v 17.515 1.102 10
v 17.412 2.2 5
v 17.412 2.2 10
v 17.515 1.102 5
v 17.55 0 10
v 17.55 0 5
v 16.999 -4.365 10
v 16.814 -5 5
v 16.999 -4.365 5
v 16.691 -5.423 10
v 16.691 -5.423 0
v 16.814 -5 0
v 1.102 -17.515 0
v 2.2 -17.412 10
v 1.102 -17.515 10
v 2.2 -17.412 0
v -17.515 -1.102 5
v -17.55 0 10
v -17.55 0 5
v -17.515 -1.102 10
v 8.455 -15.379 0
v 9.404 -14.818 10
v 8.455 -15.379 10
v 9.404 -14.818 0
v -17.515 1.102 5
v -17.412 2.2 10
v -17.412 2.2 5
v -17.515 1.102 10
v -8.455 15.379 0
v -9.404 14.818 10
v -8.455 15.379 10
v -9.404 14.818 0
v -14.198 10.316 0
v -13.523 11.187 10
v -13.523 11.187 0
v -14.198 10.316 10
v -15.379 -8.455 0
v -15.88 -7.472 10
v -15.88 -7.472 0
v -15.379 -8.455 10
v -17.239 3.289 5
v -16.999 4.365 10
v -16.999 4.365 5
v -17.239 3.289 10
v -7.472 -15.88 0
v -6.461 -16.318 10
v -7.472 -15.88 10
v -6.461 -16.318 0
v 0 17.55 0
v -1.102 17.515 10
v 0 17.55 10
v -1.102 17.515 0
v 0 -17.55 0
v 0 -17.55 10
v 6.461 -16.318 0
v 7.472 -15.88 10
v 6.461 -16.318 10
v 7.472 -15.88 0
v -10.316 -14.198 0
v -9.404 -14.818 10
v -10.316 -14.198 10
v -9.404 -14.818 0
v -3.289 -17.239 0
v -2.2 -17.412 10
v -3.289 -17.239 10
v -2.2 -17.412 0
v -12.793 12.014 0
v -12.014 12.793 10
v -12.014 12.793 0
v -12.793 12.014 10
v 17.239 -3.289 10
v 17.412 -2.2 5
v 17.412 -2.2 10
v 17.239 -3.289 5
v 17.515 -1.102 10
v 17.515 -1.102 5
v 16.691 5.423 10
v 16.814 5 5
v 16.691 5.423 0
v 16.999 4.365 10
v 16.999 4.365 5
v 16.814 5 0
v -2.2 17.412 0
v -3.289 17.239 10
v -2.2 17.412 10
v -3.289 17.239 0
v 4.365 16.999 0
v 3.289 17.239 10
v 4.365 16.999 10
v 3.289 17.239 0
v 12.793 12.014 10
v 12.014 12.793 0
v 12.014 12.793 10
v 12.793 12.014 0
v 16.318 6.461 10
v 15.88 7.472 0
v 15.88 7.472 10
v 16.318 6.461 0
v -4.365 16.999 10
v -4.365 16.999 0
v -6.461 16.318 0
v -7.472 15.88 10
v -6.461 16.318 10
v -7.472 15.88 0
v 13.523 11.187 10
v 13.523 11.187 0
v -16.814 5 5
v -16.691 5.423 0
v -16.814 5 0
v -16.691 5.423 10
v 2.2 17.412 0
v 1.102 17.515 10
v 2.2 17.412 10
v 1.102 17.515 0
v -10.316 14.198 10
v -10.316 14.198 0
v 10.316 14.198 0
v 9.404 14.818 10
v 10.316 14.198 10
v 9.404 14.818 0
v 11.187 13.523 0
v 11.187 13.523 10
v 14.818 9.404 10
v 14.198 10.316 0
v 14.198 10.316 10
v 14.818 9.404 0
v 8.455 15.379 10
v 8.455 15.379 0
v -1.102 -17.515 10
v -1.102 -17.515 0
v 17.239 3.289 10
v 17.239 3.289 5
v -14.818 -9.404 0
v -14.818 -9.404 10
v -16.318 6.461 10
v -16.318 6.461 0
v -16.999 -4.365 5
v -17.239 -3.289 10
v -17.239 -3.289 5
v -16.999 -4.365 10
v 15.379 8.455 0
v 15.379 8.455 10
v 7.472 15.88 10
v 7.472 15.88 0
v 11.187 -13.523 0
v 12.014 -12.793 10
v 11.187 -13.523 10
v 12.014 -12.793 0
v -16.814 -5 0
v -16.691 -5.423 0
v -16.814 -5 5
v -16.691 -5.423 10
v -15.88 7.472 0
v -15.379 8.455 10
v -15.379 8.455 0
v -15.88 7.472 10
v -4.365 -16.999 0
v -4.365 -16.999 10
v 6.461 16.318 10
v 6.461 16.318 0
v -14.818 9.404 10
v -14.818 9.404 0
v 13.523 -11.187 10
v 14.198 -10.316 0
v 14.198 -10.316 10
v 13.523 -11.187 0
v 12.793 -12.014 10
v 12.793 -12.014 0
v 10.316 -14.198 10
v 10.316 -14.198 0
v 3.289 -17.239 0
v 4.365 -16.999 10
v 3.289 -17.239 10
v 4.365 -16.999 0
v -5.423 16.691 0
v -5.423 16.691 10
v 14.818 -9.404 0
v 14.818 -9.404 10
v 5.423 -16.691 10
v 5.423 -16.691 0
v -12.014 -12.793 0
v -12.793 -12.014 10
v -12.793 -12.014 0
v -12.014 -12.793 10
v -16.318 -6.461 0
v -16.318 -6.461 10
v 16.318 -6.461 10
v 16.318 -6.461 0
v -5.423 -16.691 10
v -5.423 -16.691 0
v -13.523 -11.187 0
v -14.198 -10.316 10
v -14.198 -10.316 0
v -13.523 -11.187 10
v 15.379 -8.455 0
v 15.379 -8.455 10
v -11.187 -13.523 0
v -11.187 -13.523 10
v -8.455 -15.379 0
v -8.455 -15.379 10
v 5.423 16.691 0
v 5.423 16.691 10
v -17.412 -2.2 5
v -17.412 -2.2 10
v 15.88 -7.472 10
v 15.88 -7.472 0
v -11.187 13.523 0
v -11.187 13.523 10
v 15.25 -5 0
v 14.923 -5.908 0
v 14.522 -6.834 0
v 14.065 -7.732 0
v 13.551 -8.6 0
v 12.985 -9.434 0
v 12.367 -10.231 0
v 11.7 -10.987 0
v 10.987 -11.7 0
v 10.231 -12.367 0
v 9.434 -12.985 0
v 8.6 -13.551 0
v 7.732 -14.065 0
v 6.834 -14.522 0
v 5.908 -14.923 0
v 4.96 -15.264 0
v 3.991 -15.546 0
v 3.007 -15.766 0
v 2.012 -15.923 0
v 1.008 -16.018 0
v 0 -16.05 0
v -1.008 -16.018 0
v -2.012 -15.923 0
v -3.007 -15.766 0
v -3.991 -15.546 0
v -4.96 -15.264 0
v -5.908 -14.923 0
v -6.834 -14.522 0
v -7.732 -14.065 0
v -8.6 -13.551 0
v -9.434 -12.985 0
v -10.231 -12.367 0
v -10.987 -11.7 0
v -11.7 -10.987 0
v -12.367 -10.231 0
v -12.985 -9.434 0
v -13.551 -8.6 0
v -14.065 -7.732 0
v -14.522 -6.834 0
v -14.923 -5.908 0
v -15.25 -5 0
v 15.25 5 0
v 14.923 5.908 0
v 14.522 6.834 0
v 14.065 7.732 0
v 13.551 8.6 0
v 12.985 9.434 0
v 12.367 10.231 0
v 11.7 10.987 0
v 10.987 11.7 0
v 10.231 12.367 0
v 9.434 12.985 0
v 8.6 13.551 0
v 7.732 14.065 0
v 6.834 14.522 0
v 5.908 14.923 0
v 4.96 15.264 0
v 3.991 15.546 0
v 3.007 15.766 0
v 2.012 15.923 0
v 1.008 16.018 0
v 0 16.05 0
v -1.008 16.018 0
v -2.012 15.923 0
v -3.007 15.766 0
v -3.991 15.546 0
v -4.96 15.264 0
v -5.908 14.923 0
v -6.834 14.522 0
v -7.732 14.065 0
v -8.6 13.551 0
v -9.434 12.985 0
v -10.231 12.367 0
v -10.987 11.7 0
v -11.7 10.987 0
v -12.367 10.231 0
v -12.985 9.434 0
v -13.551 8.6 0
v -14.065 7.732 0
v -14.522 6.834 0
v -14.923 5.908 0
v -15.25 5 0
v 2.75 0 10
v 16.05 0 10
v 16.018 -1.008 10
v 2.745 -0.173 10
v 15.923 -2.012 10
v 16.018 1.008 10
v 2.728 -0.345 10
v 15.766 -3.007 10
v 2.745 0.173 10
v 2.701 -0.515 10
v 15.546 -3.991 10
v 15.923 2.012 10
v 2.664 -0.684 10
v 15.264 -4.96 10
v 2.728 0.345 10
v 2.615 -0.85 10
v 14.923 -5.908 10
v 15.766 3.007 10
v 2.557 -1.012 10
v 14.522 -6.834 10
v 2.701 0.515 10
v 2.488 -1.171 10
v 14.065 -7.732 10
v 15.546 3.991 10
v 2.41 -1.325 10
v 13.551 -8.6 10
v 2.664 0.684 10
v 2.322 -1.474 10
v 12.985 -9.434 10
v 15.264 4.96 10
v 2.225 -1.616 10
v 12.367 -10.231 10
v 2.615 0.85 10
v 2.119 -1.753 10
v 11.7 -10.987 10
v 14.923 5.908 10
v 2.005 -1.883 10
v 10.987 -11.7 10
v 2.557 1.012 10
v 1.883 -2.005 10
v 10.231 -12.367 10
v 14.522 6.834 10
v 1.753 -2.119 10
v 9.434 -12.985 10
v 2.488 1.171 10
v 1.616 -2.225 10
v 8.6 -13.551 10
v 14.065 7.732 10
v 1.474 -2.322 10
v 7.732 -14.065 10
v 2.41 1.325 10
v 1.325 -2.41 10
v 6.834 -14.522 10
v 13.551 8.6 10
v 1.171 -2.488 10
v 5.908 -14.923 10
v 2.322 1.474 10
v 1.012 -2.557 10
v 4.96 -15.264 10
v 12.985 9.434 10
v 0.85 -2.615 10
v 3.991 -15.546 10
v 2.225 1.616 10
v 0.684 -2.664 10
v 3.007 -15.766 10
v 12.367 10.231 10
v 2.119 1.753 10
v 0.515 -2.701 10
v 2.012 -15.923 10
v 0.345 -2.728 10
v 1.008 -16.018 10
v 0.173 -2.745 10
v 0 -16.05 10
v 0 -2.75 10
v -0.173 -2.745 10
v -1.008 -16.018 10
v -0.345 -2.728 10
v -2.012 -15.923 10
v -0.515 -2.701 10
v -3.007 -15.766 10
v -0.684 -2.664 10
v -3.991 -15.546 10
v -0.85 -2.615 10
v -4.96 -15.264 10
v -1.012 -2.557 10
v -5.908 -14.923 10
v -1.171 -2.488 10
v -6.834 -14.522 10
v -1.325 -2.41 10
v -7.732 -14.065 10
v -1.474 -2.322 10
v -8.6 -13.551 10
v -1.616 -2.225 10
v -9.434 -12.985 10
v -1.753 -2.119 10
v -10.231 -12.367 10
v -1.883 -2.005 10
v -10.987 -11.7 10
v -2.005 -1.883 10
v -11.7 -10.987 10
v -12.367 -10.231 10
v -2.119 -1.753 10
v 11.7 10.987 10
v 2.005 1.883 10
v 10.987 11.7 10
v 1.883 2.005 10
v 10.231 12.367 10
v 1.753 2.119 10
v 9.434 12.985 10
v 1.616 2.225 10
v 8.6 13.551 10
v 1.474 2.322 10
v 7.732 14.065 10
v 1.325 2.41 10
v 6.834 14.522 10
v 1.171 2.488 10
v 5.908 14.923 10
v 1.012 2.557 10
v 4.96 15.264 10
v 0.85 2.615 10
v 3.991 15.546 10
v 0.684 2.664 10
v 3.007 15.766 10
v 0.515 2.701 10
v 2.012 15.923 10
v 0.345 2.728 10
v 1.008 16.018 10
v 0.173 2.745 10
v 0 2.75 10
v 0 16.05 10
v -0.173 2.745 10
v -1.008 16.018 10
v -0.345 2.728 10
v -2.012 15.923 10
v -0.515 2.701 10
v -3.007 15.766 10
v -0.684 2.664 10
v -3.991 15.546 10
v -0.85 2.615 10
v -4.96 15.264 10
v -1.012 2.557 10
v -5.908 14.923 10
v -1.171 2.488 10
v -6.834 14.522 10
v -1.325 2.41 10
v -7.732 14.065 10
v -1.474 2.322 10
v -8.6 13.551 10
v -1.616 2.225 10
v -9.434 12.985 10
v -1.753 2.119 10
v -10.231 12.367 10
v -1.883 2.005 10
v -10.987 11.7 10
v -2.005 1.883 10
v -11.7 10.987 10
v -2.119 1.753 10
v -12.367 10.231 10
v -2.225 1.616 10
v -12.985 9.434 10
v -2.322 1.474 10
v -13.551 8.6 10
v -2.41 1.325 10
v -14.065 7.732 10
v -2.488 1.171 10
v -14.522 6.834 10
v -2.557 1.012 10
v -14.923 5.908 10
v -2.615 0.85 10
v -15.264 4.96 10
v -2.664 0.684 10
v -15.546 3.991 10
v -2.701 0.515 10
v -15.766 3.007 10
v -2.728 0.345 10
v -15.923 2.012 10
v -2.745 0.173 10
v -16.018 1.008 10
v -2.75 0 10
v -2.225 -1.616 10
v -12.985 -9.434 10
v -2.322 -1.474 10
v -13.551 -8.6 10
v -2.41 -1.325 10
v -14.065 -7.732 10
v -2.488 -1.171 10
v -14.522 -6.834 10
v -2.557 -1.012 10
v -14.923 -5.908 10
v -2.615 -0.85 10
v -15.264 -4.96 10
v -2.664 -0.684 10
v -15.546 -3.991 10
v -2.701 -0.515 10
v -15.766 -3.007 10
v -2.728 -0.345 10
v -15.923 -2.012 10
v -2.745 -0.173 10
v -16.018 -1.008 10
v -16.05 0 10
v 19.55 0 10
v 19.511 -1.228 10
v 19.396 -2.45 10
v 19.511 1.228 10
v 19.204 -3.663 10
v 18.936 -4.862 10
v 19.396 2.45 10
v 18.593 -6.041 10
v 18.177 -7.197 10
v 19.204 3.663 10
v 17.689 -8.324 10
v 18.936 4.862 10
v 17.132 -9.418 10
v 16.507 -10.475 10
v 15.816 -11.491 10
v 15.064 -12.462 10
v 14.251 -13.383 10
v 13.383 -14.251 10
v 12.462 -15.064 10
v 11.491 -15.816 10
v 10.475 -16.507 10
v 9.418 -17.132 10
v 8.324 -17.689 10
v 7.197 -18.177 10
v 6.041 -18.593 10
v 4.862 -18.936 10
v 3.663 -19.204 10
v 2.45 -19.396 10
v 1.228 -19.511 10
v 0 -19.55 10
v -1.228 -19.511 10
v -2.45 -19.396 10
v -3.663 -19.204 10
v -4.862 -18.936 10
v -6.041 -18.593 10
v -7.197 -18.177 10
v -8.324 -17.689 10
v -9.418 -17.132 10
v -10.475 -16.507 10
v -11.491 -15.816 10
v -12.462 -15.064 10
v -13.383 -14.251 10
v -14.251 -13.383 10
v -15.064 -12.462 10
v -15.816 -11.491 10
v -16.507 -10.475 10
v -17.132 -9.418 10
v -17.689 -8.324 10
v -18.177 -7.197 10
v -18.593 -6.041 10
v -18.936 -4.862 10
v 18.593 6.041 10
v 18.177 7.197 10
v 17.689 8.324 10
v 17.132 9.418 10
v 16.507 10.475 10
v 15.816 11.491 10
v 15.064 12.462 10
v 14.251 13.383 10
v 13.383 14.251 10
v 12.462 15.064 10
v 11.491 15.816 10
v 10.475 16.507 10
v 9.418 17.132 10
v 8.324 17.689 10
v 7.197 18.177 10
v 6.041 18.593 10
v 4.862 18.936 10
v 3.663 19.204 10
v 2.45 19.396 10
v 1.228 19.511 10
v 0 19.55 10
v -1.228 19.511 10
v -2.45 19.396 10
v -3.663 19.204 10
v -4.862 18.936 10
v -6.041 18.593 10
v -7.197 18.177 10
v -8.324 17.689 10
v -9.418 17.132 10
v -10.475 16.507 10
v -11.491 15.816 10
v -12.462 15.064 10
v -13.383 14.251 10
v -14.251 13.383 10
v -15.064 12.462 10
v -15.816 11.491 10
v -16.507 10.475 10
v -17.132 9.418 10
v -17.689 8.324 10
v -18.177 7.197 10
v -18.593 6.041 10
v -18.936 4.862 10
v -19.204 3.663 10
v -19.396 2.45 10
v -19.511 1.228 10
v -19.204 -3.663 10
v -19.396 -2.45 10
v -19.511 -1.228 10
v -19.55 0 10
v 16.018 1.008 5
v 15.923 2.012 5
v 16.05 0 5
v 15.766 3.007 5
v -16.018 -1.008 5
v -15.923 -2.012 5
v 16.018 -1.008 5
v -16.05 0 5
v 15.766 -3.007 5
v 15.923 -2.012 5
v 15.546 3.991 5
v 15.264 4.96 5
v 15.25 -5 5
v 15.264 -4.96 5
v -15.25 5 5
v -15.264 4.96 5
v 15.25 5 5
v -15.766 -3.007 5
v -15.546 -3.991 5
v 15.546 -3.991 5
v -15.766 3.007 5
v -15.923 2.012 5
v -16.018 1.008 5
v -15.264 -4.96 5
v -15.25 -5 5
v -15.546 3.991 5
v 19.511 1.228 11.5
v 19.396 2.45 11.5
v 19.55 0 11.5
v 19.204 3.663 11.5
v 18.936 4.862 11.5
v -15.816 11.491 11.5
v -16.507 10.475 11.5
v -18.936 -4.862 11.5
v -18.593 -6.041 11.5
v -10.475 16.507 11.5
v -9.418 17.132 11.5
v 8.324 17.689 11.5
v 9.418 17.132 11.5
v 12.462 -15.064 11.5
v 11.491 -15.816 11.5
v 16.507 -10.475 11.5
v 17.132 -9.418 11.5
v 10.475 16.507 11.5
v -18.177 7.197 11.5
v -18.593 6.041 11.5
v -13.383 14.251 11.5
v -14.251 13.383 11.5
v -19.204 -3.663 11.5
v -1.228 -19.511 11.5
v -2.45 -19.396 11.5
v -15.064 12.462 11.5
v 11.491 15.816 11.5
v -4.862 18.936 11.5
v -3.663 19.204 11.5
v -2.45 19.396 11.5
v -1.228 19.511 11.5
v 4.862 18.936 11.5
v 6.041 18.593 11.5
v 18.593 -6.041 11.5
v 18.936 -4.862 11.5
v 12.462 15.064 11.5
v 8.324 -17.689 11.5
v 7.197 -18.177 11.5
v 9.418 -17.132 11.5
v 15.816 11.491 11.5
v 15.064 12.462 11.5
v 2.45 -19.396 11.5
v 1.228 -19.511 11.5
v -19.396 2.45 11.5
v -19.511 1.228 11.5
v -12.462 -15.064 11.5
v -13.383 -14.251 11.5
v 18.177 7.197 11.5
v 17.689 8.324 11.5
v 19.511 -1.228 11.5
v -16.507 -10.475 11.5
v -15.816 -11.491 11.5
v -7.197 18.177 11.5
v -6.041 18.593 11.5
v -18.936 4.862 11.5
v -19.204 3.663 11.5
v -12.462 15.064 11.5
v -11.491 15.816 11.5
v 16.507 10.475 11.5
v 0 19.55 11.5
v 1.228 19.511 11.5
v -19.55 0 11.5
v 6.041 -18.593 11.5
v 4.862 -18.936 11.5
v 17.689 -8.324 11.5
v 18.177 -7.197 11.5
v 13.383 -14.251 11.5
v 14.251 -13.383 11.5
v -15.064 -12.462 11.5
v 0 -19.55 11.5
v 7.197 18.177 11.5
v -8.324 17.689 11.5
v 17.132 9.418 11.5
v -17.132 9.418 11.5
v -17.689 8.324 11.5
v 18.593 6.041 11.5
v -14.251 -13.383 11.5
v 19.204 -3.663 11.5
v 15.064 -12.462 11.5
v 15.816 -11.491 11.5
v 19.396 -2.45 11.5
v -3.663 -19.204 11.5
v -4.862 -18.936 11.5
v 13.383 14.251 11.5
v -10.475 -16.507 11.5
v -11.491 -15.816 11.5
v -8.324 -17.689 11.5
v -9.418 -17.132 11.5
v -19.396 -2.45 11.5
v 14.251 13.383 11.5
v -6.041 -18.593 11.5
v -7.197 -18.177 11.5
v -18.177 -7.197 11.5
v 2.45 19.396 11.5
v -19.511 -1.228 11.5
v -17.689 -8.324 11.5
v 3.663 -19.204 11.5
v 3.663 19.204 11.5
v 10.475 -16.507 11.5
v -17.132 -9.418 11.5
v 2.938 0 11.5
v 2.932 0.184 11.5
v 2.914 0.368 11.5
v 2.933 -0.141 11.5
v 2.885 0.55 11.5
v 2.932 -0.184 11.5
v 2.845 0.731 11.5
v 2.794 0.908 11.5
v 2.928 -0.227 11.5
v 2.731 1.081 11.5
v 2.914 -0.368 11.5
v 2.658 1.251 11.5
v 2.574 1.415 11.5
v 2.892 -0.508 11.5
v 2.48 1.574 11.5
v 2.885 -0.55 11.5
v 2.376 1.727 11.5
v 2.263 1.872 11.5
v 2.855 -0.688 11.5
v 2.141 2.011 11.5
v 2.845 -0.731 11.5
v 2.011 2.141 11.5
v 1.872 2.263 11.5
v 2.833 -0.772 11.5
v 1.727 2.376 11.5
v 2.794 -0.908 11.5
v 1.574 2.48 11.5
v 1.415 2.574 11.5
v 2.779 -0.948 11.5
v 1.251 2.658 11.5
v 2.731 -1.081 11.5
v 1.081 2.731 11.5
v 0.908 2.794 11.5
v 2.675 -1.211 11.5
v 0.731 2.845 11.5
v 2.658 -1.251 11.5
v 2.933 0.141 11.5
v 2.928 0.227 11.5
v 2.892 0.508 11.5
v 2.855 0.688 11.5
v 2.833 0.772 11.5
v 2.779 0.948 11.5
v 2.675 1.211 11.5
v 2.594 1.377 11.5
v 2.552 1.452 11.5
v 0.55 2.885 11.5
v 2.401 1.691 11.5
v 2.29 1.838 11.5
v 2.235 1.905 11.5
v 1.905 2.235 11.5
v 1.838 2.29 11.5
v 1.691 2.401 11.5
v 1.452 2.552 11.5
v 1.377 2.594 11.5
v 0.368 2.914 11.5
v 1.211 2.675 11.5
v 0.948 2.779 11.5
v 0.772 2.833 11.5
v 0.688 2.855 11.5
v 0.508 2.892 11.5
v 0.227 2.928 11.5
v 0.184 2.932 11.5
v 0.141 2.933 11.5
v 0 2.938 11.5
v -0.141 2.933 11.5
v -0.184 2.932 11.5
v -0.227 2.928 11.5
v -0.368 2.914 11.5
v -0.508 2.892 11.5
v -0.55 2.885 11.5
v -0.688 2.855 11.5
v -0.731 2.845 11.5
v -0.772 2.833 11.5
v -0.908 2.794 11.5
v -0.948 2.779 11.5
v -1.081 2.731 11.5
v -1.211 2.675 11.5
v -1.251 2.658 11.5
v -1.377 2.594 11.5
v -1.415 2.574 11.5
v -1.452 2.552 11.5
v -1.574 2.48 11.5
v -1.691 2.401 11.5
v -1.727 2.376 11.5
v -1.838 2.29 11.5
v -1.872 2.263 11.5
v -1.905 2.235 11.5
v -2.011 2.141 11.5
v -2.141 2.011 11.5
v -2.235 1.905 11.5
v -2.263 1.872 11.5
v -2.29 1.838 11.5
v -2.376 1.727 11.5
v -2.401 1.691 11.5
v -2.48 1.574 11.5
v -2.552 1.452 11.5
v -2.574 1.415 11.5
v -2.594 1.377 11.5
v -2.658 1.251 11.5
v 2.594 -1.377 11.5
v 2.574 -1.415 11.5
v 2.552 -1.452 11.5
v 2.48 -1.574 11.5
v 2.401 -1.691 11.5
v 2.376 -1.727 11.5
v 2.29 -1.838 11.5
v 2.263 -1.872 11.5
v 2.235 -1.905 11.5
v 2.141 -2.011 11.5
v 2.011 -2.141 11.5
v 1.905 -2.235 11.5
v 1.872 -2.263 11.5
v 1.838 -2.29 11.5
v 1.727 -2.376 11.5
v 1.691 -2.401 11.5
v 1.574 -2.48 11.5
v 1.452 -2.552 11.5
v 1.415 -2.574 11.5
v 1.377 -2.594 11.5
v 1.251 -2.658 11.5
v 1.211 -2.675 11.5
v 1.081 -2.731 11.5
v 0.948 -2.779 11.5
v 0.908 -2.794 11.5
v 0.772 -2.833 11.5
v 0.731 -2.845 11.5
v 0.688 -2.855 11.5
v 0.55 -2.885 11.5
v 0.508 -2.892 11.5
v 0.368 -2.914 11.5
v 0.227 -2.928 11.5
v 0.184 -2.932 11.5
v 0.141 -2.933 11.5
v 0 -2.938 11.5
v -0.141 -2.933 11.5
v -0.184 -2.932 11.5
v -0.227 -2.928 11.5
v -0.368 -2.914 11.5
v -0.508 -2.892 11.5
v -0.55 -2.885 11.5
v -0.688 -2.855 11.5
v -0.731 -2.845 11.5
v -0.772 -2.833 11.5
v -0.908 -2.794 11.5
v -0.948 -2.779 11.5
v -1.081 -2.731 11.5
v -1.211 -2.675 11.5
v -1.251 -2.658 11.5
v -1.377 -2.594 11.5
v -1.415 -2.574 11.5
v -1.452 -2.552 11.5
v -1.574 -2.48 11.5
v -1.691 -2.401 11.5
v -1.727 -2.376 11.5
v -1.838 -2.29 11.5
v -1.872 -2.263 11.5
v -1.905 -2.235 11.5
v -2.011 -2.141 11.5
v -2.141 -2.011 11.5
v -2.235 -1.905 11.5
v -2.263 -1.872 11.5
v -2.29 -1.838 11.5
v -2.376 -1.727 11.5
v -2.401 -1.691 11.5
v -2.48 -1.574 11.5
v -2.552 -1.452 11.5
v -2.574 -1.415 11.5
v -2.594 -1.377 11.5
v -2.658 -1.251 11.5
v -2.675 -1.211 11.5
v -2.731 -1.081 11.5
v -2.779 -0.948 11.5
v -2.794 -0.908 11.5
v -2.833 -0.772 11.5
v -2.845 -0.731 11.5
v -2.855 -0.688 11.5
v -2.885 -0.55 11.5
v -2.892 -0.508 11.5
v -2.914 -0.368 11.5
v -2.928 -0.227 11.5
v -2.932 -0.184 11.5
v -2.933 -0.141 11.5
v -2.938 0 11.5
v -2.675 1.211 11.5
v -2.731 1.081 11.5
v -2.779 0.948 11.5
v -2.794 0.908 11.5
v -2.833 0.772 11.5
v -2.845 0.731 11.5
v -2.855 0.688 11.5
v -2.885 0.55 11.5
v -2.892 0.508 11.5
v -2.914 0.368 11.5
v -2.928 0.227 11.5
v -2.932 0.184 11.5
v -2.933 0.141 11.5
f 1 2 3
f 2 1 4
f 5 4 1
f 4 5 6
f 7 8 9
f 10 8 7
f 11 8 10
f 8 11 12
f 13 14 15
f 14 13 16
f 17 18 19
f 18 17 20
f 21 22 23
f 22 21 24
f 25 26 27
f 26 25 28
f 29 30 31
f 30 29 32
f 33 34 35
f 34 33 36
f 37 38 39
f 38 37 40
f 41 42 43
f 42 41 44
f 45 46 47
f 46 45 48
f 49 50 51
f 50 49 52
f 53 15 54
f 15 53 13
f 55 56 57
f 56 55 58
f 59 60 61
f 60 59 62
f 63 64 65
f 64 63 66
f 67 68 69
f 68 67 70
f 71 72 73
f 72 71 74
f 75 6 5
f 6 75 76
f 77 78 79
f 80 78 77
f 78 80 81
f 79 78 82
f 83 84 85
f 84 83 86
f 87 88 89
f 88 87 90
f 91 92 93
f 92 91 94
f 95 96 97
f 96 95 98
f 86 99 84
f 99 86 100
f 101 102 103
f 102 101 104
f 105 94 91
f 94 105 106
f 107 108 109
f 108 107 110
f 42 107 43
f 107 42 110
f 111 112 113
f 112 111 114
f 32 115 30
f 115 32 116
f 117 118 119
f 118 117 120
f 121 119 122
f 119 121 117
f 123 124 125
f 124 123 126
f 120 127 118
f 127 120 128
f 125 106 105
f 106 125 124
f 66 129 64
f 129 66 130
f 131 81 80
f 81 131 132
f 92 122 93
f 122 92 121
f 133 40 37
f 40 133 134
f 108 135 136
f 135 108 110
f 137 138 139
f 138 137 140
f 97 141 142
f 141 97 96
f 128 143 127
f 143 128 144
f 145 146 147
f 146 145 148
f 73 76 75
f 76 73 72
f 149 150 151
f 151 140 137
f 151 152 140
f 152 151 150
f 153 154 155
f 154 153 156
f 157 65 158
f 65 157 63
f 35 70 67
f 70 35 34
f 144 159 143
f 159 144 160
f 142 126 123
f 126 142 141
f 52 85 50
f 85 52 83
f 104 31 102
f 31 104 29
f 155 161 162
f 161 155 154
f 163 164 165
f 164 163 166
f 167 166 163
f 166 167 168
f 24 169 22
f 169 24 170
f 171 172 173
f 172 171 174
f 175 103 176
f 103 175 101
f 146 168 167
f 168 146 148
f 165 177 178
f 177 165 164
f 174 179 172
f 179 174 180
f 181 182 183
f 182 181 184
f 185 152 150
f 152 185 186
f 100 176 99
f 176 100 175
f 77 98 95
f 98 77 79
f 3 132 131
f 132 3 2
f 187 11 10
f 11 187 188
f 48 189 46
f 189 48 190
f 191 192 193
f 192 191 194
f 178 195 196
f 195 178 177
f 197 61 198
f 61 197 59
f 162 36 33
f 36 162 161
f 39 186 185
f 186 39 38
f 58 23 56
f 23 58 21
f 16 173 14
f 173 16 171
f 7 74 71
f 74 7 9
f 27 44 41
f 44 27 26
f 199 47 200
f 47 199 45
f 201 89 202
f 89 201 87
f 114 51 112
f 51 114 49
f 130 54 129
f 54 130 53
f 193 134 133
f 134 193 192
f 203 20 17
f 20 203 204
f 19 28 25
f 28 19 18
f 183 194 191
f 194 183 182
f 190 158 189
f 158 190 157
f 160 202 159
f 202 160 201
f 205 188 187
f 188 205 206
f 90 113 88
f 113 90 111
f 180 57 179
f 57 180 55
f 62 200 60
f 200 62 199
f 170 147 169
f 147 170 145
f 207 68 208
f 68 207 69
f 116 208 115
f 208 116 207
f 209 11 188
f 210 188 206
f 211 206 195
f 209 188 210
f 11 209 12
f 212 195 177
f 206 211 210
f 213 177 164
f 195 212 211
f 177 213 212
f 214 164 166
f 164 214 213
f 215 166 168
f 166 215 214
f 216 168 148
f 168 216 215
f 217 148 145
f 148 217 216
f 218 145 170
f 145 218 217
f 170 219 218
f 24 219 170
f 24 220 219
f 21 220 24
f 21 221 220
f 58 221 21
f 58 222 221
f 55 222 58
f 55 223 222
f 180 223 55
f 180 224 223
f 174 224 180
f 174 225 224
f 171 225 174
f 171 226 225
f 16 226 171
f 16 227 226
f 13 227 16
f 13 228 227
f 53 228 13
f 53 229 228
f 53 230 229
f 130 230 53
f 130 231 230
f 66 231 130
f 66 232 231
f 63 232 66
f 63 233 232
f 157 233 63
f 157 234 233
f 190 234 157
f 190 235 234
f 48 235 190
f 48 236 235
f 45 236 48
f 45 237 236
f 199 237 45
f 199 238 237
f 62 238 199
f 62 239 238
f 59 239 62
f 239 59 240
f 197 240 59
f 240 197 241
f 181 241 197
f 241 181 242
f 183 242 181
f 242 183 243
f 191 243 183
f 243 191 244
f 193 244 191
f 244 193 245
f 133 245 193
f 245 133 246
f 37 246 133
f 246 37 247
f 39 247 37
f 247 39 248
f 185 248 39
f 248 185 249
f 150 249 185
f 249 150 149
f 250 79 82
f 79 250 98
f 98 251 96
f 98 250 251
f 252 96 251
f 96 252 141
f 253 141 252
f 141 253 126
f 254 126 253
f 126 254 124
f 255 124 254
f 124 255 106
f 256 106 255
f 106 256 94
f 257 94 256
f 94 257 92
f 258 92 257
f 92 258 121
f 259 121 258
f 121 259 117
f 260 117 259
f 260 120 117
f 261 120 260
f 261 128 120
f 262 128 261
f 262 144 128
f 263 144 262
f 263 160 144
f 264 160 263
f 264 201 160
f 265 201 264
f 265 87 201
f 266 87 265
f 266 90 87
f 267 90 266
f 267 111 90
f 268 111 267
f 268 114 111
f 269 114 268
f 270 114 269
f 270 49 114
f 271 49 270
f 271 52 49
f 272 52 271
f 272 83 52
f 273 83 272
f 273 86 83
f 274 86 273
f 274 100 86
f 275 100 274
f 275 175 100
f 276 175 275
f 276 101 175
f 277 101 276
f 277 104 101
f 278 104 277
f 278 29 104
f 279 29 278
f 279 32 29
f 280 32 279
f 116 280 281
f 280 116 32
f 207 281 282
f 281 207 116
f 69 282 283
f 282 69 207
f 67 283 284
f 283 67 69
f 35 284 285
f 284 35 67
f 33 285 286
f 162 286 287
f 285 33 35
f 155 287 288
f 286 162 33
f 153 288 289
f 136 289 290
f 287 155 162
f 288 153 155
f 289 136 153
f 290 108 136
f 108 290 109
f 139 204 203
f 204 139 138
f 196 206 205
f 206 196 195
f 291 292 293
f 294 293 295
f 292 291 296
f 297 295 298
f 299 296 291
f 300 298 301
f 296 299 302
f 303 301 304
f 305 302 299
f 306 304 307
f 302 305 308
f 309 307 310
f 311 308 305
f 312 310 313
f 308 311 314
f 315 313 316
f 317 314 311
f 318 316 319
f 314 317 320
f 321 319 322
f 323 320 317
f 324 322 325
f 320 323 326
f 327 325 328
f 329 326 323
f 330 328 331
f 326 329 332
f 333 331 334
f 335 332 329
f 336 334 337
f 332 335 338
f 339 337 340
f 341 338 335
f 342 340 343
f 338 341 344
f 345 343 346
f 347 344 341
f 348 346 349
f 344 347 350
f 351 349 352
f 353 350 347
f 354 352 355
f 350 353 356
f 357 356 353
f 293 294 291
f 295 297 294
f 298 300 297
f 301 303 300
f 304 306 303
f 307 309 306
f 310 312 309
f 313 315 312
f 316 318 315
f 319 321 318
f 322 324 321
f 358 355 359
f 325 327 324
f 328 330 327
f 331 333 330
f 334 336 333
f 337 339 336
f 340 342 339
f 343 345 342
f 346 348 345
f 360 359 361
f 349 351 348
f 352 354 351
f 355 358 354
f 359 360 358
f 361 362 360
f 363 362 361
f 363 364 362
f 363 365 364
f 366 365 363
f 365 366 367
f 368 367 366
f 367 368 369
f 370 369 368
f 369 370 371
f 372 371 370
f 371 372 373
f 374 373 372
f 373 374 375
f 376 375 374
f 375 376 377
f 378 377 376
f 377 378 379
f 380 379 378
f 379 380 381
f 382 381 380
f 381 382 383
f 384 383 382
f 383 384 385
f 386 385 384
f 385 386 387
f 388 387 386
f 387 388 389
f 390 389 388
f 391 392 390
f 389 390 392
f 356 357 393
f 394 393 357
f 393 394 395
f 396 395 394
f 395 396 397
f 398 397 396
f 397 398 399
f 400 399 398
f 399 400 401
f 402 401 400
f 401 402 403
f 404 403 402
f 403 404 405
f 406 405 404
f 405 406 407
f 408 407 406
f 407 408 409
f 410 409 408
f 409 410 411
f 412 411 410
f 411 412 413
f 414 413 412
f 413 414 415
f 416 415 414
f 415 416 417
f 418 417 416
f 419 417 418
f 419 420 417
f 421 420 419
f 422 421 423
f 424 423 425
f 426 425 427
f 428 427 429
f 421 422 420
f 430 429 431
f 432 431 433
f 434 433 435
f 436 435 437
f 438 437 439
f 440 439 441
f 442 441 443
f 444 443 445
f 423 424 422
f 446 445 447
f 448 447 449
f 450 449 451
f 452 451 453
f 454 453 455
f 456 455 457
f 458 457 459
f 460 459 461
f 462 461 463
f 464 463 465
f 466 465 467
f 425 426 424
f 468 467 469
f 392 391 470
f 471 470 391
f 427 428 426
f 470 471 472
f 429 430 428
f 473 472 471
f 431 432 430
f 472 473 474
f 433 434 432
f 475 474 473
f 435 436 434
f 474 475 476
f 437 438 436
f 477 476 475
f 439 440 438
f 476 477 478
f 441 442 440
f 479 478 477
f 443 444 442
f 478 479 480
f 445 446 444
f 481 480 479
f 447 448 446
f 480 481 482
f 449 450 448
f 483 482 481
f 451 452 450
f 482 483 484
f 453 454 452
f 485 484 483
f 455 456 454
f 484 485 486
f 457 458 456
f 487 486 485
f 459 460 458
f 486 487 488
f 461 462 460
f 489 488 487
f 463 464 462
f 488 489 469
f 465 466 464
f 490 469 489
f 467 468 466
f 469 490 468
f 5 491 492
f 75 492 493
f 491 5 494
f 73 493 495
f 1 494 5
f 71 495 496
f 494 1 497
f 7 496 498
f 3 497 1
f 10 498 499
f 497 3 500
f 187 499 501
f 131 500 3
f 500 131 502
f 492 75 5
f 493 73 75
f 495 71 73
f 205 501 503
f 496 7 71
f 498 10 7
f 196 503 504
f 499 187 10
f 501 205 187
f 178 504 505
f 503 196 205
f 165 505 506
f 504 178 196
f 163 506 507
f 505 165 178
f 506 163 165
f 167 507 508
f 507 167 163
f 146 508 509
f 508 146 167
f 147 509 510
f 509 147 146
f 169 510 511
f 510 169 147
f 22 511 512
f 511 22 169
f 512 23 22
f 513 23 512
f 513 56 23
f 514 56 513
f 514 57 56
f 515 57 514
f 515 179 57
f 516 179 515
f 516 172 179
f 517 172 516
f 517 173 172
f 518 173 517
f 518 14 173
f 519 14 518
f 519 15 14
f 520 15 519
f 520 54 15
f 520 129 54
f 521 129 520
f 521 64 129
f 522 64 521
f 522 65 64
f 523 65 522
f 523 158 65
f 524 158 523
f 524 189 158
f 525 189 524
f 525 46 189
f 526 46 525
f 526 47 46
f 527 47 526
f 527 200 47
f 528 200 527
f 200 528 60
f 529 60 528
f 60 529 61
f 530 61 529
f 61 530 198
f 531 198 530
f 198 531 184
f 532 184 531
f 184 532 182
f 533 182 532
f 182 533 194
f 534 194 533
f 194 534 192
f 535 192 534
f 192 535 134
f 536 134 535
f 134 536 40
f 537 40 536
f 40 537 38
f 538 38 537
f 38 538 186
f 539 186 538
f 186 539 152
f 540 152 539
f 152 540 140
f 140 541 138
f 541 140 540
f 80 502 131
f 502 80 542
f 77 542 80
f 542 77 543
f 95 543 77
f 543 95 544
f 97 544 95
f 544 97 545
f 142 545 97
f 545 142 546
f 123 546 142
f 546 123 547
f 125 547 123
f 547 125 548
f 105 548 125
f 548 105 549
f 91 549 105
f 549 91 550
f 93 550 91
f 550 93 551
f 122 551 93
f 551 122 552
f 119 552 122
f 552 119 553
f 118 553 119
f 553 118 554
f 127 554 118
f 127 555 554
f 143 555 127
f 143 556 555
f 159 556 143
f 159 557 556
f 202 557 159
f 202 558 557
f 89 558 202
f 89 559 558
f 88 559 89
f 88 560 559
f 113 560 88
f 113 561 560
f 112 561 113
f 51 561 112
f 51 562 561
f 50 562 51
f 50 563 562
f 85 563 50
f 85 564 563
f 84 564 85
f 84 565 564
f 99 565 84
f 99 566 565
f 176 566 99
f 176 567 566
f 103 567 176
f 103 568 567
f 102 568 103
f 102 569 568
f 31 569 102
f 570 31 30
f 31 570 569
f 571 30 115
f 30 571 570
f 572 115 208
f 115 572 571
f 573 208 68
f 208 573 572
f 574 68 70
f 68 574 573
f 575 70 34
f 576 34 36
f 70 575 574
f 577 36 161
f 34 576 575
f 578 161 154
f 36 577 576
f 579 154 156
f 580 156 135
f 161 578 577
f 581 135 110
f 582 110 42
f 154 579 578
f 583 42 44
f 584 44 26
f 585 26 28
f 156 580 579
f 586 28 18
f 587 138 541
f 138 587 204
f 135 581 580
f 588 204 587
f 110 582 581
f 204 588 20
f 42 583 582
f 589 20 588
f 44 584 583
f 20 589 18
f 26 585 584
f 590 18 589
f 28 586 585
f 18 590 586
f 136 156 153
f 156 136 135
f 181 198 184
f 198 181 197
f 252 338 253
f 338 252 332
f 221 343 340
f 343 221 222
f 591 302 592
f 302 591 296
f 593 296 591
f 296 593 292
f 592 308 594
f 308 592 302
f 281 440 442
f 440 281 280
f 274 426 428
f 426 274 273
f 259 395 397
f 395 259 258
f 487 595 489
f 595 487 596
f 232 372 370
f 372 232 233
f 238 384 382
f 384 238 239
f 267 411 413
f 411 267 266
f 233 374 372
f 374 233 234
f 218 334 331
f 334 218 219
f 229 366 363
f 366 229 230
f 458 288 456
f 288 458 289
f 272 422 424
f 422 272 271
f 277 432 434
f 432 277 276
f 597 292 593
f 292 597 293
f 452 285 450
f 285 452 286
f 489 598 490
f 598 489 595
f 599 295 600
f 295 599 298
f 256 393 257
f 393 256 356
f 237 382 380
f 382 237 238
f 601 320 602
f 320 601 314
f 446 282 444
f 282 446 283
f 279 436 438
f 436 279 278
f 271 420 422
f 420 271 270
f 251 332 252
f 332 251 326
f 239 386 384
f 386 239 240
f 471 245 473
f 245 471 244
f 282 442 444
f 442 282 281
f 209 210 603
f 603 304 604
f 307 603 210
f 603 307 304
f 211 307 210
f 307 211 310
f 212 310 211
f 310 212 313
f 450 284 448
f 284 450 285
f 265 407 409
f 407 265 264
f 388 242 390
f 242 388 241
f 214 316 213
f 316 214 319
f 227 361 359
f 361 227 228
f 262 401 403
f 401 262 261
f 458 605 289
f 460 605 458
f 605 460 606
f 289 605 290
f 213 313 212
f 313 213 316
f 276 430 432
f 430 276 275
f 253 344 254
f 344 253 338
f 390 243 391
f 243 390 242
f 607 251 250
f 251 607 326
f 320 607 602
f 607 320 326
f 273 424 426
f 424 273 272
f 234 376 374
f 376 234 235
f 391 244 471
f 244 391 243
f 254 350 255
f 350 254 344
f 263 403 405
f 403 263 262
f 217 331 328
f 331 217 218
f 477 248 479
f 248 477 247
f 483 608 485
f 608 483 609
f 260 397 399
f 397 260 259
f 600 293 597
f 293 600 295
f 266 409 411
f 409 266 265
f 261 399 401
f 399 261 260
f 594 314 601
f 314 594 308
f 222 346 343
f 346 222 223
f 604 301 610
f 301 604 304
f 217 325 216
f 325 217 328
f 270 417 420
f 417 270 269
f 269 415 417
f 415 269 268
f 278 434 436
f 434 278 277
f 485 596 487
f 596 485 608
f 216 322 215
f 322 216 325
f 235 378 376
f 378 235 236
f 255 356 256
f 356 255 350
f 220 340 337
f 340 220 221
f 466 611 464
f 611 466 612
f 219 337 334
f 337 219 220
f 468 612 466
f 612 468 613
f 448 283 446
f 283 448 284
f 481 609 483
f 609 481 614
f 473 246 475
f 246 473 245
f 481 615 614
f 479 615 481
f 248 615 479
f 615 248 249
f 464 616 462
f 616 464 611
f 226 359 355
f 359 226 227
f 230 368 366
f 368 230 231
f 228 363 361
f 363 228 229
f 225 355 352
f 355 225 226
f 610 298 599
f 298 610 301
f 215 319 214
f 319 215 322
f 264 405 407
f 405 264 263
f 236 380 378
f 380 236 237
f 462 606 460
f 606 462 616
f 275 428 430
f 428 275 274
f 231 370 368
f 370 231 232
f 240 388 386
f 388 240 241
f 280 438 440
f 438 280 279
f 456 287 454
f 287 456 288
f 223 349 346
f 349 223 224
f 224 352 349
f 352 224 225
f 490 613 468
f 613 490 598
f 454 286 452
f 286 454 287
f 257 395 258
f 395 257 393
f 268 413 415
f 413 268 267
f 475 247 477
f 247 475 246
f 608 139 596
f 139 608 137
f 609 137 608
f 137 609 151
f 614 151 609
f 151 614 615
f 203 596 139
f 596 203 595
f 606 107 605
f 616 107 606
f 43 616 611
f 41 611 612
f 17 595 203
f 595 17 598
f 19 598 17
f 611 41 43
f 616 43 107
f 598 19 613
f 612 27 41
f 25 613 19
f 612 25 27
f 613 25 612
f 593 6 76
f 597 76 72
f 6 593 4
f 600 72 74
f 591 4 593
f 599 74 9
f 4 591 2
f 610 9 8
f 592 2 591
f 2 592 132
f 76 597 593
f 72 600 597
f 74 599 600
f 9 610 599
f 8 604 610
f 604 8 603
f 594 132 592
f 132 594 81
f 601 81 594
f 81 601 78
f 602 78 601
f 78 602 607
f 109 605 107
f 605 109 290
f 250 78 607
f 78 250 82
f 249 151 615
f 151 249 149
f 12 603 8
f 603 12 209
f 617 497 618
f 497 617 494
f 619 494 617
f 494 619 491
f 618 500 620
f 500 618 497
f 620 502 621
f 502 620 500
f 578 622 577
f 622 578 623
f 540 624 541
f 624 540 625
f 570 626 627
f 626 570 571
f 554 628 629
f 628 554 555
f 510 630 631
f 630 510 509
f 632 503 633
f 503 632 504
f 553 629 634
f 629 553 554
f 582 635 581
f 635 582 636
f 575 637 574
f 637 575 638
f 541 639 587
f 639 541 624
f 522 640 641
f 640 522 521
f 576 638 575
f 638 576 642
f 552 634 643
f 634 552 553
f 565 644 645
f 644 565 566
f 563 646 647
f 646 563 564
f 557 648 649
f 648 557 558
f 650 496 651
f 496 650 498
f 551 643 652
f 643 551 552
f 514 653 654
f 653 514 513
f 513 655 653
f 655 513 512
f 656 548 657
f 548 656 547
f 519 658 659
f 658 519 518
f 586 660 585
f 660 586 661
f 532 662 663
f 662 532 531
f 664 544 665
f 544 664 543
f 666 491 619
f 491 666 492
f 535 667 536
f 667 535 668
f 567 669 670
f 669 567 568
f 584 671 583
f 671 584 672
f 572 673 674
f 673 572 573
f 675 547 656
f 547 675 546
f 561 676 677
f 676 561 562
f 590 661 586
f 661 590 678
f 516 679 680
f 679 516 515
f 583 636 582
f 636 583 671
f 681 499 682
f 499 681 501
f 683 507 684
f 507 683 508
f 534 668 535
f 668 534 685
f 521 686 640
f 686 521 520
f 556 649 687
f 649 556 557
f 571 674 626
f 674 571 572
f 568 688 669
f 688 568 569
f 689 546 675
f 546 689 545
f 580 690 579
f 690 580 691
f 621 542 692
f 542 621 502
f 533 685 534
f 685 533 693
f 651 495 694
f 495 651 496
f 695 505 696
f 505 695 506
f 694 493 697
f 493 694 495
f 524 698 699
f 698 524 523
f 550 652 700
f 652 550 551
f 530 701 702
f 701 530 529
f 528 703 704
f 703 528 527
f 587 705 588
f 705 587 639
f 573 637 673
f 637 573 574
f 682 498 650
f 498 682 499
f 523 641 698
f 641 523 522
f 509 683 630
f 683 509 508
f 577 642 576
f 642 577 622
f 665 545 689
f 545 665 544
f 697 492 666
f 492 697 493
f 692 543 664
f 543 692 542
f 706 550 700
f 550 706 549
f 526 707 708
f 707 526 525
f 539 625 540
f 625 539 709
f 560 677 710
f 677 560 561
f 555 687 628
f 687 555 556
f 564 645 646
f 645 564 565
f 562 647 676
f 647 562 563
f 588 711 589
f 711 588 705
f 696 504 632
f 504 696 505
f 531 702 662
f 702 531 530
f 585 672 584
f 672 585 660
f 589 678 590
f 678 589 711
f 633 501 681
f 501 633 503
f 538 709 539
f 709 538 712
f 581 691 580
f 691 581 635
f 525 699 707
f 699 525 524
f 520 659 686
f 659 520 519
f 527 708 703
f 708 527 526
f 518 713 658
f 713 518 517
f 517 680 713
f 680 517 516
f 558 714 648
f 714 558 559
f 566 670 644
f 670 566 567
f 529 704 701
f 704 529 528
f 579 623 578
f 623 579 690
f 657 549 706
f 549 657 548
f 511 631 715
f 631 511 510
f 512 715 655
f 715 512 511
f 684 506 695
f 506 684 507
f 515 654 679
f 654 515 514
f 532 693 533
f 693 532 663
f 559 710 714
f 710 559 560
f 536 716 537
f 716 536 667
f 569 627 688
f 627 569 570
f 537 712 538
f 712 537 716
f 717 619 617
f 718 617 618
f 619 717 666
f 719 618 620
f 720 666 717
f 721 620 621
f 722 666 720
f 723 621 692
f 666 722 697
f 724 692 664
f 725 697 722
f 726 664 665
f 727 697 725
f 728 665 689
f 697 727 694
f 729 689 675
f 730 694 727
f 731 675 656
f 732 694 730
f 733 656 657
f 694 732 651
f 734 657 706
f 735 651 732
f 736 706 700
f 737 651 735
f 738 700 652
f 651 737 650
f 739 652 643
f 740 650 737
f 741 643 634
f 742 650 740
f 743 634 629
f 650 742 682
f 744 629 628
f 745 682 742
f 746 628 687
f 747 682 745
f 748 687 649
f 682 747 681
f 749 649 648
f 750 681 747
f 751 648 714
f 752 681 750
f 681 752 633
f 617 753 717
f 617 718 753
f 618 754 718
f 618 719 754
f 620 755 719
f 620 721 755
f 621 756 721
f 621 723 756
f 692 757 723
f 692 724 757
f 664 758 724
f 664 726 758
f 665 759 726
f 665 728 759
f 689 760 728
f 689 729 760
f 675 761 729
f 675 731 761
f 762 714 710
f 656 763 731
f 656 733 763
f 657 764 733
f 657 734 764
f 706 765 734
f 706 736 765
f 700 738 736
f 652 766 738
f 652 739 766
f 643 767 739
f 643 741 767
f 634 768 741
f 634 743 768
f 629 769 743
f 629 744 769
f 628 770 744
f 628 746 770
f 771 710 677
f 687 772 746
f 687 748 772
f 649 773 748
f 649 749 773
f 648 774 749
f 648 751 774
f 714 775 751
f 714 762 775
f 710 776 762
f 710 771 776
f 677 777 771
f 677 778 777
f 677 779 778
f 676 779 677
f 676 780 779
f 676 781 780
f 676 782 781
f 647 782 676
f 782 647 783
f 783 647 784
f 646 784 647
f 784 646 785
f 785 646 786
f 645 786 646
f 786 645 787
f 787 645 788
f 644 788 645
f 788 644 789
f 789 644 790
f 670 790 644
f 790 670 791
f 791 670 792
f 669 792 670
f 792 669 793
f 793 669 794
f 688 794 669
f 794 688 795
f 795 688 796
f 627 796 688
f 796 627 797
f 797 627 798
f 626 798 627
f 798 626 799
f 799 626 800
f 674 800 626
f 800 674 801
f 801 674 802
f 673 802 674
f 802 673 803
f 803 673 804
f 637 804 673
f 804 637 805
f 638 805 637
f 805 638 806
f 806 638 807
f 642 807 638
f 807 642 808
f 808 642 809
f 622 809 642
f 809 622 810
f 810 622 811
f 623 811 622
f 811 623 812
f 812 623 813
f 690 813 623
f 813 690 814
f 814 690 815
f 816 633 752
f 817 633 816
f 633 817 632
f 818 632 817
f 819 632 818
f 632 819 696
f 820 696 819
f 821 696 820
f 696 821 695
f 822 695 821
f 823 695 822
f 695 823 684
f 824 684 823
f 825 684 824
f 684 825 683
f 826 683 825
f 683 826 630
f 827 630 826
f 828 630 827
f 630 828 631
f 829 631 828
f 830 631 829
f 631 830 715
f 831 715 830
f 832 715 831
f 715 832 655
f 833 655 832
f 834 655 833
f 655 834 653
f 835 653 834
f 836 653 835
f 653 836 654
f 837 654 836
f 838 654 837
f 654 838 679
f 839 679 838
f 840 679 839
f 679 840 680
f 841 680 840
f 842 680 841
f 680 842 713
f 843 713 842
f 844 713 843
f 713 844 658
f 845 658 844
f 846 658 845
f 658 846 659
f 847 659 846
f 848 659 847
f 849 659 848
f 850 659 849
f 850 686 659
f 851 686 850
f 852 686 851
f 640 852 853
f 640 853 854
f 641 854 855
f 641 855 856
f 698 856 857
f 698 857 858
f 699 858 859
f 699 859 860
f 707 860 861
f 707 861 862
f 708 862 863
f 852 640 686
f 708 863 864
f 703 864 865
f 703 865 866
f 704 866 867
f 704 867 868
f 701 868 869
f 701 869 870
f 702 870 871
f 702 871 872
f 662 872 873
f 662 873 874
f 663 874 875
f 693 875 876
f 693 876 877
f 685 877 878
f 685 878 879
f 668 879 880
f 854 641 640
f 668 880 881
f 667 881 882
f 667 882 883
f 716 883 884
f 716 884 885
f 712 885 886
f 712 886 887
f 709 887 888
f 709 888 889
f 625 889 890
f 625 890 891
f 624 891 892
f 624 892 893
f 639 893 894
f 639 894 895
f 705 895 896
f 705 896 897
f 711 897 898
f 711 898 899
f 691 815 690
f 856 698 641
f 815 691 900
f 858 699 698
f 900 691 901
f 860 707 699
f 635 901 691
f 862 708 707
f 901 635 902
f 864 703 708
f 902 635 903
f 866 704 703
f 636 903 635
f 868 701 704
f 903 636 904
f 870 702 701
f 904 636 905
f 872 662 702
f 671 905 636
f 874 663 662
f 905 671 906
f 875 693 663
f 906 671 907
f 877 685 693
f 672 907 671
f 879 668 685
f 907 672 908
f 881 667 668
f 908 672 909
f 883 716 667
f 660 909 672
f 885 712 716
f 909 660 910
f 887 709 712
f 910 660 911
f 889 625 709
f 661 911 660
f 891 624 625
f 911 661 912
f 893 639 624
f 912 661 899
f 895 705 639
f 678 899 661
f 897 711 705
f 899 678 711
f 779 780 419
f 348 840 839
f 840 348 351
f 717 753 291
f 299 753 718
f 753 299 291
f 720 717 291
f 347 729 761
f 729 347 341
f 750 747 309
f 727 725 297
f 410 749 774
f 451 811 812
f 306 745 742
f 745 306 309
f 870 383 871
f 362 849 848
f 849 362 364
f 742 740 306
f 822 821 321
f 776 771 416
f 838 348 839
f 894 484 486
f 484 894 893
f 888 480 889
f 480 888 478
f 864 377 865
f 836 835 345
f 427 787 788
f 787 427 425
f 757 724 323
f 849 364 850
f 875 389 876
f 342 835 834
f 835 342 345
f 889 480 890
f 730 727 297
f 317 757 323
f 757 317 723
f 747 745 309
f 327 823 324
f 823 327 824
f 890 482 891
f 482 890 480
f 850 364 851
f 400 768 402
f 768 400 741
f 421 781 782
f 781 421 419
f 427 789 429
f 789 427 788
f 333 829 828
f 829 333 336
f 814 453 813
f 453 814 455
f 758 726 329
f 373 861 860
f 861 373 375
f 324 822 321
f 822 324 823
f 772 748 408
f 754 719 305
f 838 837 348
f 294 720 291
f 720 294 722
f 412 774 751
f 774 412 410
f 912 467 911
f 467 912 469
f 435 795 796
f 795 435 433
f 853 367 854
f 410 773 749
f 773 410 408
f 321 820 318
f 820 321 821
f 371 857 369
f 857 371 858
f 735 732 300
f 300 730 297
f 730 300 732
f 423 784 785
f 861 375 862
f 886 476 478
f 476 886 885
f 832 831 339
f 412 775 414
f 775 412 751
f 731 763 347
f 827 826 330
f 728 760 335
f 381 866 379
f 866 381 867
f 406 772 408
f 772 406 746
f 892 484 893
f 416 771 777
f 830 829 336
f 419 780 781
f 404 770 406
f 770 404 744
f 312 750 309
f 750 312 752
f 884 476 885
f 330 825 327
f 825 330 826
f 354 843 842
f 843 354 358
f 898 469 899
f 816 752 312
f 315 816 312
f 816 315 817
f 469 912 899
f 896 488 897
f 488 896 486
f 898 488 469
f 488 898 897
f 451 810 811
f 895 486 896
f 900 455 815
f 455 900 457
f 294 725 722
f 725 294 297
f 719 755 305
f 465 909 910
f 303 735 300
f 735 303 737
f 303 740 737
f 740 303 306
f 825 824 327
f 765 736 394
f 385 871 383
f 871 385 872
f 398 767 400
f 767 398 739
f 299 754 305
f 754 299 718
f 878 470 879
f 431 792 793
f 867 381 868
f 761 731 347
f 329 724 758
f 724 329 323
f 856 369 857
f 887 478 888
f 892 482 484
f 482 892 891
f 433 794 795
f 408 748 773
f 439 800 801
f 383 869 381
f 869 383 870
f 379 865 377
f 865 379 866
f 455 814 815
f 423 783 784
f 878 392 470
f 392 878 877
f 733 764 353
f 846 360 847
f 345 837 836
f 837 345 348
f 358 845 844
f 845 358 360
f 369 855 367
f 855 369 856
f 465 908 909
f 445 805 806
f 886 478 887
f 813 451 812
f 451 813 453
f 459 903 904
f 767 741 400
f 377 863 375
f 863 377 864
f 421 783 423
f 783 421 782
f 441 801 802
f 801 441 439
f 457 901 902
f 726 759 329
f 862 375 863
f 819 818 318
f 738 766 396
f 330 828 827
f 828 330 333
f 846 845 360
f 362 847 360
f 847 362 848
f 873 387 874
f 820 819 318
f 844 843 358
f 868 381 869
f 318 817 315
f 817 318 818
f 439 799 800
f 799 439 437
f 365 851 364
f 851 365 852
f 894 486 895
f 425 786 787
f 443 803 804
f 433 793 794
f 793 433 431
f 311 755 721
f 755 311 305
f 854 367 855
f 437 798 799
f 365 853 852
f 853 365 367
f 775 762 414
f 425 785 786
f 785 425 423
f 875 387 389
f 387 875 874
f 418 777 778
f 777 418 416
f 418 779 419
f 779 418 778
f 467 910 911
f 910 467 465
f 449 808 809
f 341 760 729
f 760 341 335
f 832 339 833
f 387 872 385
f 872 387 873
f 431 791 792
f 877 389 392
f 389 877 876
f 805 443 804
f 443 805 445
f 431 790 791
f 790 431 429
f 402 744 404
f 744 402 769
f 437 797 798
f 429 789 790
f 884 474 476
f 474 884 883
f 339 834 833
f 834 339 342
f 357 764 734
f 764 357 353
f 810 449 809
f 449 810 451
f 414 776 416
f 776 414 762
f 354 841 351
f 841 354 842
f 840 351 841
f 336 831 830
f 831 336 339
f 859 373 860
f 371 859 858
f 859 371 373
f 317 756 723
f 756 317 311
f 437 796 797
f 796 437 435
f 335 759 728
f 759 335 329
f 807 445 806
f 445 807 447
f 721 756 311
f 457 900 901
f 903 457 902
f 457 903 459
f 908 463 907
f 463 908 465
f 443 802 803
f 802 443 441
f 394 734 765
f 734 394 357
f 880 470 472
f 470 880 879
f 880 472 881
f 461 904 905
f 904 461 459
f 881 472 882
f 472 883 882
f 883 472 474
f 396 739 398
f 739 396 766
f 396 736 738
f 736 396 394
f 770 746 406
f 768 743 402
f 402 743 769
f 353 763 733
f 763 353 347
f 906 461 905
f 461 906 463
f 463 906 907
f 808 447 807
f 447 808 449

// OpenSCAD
r = 35.5/2-0.2;

$fn=100;

difference(){
    cylinder(10, r, r);
    cylinder(11, r-1.5, r-1.5);
    cube([50, 10, 10], true);
}

translate([0,0,10])
difference(){
    cylinder(1.5, r+2, r+2);
    #cylinder(
            2,
            5.5/2,
            6/2
    );
}
